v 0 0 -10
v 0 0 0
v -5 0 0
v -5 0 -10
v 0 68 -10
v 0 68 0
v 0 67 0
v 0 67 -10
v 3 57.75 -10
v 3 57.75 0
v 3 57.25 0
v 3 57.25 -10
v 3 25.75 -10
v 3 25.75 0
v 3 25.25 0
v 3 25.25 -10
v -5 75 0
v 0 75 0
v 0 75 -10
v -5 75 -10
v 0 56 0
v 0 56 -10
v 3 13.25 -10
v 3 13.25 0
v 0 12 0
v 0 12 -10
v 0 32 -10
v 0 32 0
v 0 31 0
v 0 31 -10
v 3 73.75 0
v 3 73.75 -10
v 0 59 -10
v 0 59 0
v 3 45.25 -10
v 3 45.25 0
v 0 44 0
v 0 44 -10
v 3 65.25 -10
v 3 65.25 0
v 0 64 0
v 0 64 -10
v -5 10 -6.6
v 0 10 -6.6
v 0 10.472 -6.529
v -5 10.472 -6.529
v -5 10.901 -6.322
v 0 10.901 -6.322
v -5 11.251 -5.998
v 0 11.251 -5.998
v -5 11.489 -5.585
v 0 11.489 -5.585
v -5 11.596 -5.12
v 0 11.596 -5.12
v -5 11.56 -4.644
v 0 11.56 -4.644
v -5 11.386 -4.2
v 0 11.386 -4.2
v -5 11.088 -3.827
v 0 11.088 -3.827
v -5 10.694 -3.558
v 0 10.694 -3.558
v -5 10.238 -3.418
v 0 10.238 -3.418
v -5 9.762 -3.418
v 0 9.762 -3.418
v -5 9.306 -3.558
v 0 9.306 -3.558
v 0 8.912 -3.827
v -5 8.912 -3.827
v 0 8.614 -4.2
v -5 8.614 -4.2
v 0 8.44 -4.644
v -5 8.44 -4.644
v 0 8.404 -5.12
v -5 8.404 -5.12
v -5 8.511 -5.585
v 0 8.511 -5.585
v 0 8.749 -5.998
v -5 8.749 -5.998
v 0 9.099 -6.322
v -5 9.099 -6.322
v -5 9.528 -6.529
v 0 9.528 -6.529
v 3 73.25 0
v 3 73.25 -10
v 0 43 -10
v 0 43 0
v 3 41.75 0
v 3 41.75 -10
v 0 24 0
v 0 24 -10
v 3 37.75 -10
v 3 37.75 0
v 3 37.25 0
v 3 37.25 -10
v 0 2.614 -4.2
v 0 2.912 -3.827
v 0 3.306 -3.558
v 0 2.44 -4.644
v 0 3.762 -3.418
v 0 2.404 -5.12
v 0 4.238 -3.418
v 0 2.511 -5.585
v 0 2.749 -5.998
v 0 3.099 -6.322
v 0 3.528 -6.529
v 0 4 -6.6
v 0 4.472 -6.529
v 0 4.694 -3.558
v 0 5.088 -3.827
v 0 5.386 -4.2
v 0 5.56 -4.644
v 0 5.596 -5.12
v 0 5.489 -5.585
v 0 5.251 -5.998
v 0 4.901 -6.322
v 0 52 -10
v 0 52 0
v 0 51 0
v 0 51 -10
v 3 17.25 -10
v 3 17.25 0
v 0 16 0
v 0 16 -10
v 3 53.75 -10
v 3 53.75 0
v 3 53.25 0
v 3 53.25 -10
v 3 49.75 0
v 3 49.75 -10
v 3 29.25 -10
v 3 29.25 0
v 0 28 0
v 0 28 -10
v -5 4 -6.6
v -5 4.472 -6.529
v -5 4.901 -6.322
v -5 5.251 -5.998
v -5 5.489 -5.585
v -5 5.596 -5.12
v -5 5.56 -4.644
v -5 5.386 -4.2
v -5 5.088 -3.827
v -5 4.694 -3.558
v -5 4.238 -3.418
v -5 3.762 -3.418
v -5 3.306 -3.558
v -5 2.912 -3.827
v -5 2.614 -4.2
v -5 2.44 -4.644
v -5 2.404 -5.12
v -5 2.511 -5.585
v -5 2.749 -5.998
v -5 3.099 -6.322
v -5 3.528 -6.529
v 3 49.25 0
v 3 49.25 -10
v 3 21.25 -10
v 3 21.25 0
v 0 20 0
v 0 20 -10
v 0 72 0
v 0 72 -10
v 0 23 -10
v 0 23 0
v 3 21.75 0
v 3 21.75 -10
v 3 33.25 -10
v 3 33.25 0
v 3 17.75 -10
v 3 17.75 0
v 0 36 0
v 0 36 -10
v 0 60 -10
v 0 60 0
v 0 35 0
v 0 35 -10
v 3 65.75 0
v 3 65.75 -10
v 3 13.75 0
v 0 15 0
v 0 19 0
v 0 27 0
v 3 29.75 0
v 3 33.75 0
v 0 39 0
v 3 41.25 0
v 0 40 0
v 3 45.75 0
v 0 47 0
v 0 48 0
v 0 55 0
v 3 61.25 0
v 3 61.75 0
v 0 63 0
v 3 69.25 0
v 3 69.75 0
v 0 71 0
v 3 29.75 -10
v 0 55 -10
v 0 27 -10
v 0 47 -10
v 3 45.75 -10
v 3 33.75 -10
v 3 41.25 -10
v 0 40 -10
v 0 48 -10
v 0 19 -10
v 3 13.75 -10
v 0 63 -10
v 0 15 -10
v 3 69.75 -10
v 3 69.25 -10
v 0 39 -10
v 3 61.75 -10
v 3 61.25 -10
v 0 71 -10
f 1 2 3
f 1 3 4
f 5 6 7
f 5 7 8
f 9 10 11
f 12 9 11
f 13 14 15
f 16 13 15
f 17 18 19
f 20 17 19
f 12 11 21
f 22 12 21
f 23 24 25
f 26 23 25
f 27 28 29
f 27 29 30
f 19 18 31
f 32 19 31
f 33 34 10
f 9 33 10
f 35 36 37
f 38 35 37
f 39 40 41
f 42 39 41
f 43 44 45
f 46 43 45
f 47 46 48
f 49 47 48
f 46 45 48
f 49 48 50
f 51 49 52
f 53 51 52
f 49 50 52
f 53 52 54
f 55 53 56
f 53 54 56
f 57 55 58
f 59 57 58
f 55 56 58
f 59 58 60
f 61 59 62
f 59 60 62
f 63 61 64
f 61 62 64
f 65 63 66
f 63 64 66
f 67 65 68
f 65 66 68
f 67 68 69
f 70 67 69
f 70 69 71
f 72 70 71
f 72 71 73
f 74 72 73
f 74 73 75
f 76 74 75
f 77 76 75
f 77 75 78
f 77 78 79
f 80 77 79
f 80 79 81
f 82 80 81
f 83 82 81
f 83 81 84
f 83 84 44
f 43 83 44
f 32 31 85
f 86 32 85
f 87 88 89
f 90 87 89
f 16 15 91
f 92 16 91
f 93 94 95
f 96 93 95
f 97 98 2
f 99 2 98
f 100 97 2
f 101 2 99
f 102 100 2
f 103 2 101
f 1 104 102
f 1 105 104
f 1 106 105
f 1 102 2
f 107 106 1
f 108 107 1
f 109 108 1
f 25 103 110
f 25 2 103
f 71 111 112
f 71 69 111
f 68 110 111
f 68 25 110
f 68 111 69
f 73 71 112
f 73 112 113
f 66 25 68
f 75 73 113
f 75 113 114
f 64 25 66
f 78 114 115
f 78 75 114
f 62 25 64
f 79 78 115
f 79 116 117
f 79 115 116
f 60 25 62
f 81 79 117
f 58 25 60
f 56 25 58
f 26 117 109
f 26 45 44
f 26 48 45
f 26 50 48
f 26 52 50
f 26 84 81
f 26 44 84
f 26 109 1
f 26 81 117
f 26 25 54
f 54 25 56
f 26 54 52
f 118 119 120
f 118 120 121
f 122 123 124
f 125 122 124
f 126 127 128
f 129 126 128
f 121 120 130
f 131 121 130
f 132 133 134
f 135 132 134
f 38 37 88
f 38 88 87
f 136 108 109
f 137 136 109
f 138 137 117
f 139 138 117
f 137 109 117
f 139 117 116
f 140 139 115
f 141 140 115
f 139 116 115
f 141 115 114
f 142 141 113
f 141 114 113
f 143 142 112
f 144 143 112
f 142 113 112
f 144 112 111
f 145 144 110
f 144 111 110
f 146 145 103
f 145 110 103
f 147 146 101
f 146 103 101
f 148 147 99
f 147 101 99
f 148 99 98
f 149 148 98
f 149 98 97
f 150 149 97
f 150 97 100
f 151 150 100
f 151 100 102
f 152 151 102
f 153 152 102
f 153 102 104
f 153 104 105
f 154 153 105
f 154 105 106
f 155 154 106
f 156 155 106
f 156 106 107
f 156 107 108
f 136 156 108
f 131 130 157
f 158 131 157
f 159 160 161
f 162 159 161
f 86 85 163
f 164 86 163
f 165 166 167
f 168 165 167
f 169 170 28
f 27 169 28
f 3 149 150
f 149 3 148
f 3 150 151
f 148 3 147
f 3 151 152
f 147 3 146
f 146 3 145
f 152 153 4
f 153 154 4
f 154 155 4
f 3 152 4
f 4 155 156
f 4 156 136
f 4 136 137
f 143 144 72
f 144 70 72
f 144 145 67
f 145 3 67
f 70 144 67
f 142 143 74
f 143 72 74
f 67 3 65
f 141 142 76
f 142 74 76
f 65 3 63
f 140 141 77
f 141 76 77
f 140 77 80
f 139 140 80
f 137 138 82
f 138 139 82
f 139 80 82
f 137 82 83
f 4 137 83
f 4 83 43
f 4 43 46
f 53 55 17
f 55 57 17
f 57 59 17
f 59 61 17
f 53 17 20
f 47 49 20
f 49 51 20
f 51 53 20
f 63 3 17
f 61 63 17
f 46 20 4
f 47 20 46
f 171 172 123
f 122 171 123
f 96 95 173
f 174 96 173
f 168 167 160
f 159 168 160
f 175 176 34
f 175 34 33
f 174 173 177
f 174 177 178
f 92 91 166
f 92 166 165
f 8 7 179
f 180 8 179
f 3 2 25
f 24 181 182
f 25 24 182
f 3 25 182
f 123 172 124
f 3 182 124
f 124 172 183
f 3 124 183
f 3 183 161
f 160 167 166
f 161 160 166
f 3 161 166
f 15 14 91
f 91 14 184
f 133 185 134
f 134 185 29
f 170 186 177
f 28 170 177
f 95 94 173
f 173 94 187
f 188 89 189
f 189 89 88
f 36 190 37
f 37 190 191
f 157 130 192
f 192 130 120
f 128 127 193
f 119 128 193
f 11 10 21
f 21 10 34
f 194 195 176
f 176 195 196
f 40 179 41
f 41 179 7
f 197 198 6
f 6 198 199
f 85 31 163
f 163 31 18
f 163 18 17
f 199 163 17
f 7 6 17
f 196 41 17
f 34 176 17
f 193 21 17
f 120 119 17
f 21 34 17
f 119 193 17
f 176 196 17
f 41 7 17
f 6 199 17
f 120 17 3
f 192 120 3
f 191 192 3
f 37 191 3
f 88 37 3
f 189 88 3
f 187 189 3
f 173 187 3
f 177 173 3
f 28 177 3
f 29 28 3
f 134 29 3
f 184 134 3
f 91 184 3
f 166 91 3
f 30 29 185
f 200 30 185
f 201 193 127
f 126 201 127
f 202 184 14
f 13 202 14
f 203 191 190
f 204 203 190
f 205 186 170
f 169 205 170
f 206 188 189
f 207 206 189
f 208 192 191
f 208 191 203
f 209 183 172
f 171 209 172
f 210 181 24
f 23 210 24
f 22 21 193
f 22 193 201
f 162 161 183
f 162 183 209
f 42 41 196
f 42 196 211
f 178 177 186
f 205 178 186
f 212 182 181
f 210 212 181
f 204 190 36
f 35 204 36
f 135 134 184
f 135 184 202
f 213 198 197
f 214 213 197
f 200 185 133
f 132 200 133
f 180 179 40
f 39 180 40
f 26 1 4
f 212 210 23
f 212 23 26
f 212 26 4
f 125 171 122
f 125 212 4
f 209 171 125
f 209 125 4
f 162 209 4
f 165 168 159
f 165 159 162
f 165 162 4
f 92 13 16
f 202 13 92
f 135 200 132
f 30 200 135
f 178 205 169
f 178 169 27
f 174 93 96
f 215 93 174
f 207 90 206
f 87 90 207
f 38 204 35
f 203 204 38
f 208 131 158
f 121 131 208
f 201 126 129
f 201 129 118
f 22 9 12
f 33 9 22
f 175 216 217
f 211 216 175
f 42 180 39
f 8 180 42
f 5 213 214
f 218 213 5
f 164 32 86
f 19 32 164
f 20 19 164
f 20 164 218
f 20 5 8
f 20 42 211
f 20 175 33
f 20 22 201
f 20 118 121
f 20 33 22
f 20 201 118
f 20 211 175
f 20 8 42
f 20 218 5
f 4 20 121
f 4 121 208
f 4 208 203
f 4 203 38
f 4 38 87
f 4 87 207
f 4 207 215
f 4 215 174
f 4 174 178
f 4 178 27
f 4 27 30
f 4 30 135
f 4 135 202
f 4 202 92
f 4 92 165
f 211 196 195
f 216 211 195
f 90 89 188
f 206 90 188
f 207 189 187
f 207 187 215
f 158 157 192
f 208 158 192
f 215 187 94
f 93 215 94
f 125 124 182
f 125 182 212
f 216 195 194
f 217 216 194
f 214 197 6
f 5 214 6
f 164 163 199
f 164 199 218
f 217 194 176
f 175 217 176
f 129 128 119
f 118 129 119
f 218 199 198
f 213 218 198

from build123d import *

# Parameters (mm, degrees)
ESQUISSE1_W                = 10
ESQUISSE1_H                = 75
BOSS_EXTRU_1_DEPTH         = 5
BOSS_EXTRU_2_DEPTH         = 10
R_P_TITION_LIN_AIRE1_COUNT = 16
R_P_TITION_LIN_AIRE1_PITCH = 4
ESQUISSE3_R                = 1.6
ENL_V_MAT_EXTRU_1_DEPTH    = 10


with BuildPart() as part:
    # Esquisse1 → Boss.-Extru.1 (new body)
    with BuildSketch(Plane(origin=(0, 0, 0), x_dir=(0, 0, -1), z_dir=(1, 0, 0))):
        with Locations((5, 37.5)):
            Rectangle(ESQUISSE1_W, ESQUISSE1_H)
    extrude(amount=-BOSS_EXTRU_1_DEPTH)

    # Esquisse2 → Boss.-Extru.2 (add)
    with BuildSketch(Plane.XY):
        Polygon((0, 75), (3, 73.75), (3, 73.25), (0, 72), align=None)
    boss_extru_2 = extrude(amount=-BOSS_EXTRU_2_DEPTH)

    # Répétition linéaire1: Boss.-Extru.2 ×16
    with Locations(*[(0, -i * R_P_TITION_LIN_AIRE1_PITCH, 0) for i in range(1, R_P_TITION_LIN_AIRE1_COUNT)]):
        add(boss_extru_2)

    # Esquisse3 → Enlèv. mat.-Extru.1 (cut)
    with BuildSketch(Plane(origin=(0, 0, 0), x_dir=(0, 0, -1), z_dir=(1, 0, 0))):
        with Locations((5, 10)):
            Circle(ESQUISSE3_R)
        with Locations((5, 4)):
            Circle(ESQUISSE3_R)
    extrude(amount=-ENL_V_MAT_EXTRU_1_DEPTH, mode=Mode.SUBTRACT)


solid = part.part
